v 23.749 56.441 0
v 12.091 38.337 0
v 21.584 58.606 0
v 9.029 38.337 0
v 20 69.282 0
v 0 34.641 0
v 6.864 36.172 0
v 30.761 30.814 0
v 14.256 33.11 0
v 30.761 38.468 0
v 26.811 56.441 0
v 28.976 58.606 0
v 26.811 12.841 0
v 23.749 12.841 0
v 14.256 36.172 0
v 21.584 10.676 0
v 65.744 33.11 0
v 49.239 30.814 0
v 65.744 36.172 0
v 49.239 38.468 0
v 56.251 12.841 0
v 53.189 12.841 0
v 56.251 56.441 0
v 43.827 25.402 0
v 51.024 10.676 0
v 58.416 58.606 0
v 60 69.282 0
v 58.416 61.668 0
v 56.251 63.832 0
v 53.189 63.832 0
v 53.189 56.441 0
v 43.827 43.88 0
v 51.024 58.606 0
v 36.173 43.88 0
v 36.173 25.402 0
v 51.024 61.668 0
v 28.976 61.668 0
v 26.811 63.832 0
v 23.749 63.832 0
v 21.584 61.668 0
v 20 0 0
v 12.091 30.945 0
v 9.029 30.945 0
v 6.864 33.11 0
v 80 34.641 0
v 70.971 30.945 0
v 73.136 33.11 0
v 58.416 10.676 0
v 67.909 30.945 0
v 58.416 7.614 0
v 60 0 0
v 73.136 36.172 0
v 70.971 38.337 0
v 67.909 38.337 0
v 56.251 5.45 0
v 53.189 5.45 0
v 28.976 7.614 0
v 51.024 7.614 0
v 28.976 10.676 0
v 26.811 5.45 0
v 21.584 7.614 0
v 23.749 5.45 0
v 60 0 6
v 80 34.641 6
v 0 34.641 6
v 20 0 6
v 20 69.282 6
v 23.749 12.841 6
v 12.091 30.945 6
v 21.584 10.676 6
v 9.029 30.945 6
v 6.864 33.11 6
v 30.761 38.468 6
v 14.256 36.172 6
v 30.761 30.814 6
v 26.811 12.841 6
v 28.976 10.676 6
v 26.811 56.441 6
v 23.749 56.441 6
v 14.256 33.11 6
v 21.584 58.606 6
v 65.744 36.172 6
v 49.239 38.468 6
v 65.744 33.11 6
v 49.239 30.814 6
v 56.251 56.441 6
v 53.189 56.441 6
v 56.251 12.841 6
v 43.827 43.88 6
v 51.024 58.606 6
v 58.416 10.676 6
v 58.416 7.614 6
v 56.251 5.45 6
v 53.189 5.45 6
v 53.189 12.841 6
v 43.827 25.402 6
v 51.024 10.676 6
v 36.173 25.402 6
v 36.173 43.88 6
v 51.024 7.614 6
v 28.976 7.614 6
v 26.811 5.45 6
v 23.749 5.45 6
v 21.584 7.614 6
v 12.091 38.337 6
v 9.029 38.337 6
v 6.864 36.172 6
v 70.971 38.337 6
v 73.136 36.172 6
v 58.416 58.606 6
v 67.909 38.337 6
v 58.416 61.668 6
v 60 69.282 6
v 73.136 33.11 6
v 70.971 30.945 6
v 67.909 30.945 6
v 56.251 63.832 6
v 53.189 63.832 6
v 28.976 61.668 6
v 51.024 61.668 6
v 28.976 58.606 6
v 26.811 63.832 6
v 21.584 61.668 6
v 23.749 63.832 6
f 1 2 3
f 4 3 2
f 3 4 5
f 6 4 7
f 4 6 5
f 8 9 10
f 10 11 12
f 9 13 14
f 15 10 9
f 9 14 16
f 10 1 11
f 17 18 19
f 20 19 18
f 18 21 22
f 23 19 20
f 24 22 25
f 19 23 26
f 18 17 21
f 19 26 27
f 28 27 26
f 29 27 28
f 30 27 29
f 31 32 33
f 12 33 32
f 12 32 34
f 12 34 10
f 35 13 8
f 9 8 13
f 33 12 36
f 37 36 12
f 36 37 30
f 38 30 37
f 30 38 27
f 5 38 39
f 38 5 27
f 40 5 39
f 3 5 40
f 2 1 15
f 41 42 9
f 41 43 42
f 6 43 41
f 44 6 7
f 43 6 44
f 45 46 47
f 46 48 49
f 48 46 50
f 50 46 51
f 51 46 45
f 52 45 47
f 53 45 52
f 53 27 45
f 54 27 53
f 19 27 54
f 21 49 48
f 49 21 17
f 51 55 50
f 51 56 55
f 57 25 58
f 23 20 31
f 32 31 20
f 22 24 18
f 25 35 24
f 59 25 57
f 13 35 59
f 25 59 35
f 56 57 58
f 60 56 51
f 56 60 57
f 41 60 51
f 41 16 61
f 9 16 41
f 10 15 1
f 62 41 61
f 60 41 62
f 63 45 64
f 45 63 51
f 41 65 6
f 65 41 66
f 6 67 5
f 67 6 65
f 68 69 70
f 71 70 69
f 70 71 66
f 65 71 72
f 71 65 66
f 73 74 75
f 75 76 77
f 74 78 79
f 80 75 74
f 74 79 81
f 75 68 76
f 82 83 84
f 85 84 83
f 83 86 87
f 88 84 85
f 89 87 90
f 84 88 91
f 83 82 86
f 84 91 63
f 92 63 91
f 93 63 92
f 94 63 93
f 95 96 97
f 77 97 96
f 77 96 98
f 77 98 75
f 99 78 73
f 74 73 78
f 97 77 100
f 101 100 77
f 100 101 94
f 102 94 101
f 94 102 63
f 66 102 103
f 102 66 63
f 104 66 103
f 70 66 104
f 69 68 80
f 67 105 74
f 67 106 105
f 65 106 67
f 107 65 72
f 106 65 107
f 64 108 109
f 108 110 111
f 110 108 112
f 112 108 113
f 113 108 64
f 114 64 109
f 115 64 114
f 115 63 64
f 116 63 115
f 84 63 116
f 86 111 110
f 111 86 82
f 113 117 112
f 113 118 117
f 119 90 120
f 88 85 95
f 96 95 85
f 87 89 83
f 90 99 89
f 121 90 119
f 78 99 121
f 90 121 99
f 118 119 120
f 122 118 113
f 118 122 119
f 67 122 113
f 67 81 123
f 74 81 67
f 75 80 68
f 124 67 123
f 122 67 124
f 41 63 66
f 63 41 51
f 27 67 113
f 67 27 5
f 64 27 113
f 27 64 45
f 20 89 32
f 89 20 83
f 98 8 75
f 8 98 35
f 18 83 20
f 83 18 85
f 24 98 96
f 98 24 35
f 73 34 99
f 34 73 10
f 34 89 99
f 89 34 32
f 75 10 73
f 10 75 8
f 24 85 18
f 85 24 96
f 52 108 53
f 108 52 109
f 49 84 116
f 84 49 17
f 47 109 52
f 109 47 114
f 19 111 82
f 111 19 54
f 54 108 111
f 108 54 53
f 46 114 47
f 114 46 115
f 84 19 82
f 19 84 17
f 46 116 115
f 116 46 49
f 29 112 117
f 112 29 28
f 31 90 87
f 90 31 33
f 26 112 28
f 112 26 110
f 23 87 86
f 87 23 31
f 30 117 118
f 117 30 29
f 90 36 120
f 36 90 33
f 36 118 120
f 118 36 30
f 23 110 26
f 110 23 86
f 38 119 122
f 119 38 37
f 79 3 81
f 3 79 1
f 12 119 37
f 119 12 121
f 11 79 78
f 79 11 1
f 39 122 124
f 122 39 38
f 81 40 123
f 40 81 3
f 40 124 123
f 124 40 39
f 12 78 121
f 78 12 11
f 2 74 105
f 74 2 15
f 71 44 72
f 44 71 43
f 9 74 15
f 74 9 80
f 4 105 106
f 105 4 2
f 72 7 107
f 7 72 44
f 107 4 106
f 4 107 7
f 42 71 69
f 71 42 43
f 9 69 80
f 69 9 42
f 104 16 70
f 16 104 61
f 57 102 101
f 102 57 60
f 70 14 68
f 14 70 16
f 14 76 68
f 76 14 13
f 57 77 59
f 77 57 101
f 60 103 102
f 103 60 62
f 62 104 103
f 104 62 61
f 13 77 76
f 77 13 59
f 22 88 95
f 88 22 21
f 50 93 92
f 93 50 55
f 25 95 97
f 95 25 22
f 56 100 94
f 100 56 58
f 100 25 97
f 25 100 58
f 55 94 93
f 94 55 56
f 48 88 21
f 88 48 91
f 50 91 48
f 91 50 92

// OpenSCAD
$fn = 32;

// ----------------------------------------------------------------------
// Polygon plate: 6-gon R40, 6 bolt windows
// ----------------------------------------------------------------------

// --- parameters (mm) ---
sides = 6;                // number of polygon sides
plate_r = 40;             // circumscribed radius of the polygon
bore_r = 10;              // centre bore radius
bolts = 6;                // number of bolt windows
ring_r = 29.44;           // bolt-circle radius
bolt_r = 4;               // bolt window radius
plate_t = 6;              // plate thickness, Z (extrusion height)

plate_d = 2 * plate_r;  // circumscribed diameter
bore_d = 2 * bore_r;  // centre bore diameter
bolt_d = 2 * bolt_r;  // bolt window diameter
ring_d = 2 * ring_r;  // bolt-circle diameter

profile = [[80, 34.641], [60, 69.282], [20, 69.282], [0, 34.641], [20, 0], [60, 0]];  // primary outline, 6 points, counter clockwise
void_1 = [[49.239, 38.468], [43.827, 43.88], [36.173, 43.88], [30.761, 38.468], [30.761, 30.814], [36.173, 25.402], [43.827, 25.402], [49.239, 30.814]];  // centre bore, 8 points
void_2 = [[73.136, 36.172], [70.971, 38.337], [67.909, 38.337], [65.744, 36.172], [65.744, 33.11], [67.909, 30.945], [70.971, 30.945], [73.136, 33.11]];  // bolt window 1, 8 points
void_3 = [[58.416, 61.668], [56.251, 63.832], [53.189, 63.832], [51.024, 61.668], [51.024, 58.606], [53.189, 56.441], [56.251, 56.441], [58.416, 58.606]];  // bolt window 2, 8 points
void_4 = [[28.976, 61.668], [26.811, 63.832], [23.749, 63.832], [21.584, 61.668], [21.584, 58.606], [23.749, 56.441], [26.811, 56.441], [28.976, 58.606]];  // bolt window 3, 8 points
void_5 = [[14.256, 36.172], [12.091, 38.337], [9.029, 38.337], [6.864, 36.172], [6.864, 33.11], [9.029, 30.945], [12.091, 30.945], [14.256, 33.11]];  // bolt window 4, 8 points
void_6 = [[28.976, 10.676], [26.811, 12.841], [23.749, 12.841], [21.584, 10.676], [21.584, 7.614], [23.749, 5.45], [26.811, 5.45], [28.976, 7.614]];  // bolt window 5, 8 points
void_7 = [[58.416, 10.676], [56.251, 12.841], [53.189, 12.841], [51.024, 10.676], [51.024, 7.614], [53.189, 5.45], [56.251, 5.45], [58.416, 7.614]];  // bolt window 6, 8 points

// --- the one profile operation ---
difference() {
  linear_extrude(height = plate_t) polygon(points = profile);
  translate([0, 0, -1])
    linear_extrude(height = plate_t + 2) polygon(points = void_1);
  translate([0, 0, -1])
    linear_extrude(height = plate_t + 2) polygon(points = void_2);
  translate([0, 0, -1])
    linear_extrude(height = plate_t + 2) polygon(points = void_3);
  translate([0, 0, -1])
    linear_extrude(height = plate_t + 2) polygon(points = void_4);
  translate([0, 0, -1])
    linear_extrude(height = plate_t + 2) polygon(points = void_5);
  translate([0, 0, -1])
    linear_extrude(height = plate_t + 2) polygon(points = void_6);
  translate([0, 0, -1])
    linear_extrude(height = plate_t + 2) polygon(points = void_7);
}
